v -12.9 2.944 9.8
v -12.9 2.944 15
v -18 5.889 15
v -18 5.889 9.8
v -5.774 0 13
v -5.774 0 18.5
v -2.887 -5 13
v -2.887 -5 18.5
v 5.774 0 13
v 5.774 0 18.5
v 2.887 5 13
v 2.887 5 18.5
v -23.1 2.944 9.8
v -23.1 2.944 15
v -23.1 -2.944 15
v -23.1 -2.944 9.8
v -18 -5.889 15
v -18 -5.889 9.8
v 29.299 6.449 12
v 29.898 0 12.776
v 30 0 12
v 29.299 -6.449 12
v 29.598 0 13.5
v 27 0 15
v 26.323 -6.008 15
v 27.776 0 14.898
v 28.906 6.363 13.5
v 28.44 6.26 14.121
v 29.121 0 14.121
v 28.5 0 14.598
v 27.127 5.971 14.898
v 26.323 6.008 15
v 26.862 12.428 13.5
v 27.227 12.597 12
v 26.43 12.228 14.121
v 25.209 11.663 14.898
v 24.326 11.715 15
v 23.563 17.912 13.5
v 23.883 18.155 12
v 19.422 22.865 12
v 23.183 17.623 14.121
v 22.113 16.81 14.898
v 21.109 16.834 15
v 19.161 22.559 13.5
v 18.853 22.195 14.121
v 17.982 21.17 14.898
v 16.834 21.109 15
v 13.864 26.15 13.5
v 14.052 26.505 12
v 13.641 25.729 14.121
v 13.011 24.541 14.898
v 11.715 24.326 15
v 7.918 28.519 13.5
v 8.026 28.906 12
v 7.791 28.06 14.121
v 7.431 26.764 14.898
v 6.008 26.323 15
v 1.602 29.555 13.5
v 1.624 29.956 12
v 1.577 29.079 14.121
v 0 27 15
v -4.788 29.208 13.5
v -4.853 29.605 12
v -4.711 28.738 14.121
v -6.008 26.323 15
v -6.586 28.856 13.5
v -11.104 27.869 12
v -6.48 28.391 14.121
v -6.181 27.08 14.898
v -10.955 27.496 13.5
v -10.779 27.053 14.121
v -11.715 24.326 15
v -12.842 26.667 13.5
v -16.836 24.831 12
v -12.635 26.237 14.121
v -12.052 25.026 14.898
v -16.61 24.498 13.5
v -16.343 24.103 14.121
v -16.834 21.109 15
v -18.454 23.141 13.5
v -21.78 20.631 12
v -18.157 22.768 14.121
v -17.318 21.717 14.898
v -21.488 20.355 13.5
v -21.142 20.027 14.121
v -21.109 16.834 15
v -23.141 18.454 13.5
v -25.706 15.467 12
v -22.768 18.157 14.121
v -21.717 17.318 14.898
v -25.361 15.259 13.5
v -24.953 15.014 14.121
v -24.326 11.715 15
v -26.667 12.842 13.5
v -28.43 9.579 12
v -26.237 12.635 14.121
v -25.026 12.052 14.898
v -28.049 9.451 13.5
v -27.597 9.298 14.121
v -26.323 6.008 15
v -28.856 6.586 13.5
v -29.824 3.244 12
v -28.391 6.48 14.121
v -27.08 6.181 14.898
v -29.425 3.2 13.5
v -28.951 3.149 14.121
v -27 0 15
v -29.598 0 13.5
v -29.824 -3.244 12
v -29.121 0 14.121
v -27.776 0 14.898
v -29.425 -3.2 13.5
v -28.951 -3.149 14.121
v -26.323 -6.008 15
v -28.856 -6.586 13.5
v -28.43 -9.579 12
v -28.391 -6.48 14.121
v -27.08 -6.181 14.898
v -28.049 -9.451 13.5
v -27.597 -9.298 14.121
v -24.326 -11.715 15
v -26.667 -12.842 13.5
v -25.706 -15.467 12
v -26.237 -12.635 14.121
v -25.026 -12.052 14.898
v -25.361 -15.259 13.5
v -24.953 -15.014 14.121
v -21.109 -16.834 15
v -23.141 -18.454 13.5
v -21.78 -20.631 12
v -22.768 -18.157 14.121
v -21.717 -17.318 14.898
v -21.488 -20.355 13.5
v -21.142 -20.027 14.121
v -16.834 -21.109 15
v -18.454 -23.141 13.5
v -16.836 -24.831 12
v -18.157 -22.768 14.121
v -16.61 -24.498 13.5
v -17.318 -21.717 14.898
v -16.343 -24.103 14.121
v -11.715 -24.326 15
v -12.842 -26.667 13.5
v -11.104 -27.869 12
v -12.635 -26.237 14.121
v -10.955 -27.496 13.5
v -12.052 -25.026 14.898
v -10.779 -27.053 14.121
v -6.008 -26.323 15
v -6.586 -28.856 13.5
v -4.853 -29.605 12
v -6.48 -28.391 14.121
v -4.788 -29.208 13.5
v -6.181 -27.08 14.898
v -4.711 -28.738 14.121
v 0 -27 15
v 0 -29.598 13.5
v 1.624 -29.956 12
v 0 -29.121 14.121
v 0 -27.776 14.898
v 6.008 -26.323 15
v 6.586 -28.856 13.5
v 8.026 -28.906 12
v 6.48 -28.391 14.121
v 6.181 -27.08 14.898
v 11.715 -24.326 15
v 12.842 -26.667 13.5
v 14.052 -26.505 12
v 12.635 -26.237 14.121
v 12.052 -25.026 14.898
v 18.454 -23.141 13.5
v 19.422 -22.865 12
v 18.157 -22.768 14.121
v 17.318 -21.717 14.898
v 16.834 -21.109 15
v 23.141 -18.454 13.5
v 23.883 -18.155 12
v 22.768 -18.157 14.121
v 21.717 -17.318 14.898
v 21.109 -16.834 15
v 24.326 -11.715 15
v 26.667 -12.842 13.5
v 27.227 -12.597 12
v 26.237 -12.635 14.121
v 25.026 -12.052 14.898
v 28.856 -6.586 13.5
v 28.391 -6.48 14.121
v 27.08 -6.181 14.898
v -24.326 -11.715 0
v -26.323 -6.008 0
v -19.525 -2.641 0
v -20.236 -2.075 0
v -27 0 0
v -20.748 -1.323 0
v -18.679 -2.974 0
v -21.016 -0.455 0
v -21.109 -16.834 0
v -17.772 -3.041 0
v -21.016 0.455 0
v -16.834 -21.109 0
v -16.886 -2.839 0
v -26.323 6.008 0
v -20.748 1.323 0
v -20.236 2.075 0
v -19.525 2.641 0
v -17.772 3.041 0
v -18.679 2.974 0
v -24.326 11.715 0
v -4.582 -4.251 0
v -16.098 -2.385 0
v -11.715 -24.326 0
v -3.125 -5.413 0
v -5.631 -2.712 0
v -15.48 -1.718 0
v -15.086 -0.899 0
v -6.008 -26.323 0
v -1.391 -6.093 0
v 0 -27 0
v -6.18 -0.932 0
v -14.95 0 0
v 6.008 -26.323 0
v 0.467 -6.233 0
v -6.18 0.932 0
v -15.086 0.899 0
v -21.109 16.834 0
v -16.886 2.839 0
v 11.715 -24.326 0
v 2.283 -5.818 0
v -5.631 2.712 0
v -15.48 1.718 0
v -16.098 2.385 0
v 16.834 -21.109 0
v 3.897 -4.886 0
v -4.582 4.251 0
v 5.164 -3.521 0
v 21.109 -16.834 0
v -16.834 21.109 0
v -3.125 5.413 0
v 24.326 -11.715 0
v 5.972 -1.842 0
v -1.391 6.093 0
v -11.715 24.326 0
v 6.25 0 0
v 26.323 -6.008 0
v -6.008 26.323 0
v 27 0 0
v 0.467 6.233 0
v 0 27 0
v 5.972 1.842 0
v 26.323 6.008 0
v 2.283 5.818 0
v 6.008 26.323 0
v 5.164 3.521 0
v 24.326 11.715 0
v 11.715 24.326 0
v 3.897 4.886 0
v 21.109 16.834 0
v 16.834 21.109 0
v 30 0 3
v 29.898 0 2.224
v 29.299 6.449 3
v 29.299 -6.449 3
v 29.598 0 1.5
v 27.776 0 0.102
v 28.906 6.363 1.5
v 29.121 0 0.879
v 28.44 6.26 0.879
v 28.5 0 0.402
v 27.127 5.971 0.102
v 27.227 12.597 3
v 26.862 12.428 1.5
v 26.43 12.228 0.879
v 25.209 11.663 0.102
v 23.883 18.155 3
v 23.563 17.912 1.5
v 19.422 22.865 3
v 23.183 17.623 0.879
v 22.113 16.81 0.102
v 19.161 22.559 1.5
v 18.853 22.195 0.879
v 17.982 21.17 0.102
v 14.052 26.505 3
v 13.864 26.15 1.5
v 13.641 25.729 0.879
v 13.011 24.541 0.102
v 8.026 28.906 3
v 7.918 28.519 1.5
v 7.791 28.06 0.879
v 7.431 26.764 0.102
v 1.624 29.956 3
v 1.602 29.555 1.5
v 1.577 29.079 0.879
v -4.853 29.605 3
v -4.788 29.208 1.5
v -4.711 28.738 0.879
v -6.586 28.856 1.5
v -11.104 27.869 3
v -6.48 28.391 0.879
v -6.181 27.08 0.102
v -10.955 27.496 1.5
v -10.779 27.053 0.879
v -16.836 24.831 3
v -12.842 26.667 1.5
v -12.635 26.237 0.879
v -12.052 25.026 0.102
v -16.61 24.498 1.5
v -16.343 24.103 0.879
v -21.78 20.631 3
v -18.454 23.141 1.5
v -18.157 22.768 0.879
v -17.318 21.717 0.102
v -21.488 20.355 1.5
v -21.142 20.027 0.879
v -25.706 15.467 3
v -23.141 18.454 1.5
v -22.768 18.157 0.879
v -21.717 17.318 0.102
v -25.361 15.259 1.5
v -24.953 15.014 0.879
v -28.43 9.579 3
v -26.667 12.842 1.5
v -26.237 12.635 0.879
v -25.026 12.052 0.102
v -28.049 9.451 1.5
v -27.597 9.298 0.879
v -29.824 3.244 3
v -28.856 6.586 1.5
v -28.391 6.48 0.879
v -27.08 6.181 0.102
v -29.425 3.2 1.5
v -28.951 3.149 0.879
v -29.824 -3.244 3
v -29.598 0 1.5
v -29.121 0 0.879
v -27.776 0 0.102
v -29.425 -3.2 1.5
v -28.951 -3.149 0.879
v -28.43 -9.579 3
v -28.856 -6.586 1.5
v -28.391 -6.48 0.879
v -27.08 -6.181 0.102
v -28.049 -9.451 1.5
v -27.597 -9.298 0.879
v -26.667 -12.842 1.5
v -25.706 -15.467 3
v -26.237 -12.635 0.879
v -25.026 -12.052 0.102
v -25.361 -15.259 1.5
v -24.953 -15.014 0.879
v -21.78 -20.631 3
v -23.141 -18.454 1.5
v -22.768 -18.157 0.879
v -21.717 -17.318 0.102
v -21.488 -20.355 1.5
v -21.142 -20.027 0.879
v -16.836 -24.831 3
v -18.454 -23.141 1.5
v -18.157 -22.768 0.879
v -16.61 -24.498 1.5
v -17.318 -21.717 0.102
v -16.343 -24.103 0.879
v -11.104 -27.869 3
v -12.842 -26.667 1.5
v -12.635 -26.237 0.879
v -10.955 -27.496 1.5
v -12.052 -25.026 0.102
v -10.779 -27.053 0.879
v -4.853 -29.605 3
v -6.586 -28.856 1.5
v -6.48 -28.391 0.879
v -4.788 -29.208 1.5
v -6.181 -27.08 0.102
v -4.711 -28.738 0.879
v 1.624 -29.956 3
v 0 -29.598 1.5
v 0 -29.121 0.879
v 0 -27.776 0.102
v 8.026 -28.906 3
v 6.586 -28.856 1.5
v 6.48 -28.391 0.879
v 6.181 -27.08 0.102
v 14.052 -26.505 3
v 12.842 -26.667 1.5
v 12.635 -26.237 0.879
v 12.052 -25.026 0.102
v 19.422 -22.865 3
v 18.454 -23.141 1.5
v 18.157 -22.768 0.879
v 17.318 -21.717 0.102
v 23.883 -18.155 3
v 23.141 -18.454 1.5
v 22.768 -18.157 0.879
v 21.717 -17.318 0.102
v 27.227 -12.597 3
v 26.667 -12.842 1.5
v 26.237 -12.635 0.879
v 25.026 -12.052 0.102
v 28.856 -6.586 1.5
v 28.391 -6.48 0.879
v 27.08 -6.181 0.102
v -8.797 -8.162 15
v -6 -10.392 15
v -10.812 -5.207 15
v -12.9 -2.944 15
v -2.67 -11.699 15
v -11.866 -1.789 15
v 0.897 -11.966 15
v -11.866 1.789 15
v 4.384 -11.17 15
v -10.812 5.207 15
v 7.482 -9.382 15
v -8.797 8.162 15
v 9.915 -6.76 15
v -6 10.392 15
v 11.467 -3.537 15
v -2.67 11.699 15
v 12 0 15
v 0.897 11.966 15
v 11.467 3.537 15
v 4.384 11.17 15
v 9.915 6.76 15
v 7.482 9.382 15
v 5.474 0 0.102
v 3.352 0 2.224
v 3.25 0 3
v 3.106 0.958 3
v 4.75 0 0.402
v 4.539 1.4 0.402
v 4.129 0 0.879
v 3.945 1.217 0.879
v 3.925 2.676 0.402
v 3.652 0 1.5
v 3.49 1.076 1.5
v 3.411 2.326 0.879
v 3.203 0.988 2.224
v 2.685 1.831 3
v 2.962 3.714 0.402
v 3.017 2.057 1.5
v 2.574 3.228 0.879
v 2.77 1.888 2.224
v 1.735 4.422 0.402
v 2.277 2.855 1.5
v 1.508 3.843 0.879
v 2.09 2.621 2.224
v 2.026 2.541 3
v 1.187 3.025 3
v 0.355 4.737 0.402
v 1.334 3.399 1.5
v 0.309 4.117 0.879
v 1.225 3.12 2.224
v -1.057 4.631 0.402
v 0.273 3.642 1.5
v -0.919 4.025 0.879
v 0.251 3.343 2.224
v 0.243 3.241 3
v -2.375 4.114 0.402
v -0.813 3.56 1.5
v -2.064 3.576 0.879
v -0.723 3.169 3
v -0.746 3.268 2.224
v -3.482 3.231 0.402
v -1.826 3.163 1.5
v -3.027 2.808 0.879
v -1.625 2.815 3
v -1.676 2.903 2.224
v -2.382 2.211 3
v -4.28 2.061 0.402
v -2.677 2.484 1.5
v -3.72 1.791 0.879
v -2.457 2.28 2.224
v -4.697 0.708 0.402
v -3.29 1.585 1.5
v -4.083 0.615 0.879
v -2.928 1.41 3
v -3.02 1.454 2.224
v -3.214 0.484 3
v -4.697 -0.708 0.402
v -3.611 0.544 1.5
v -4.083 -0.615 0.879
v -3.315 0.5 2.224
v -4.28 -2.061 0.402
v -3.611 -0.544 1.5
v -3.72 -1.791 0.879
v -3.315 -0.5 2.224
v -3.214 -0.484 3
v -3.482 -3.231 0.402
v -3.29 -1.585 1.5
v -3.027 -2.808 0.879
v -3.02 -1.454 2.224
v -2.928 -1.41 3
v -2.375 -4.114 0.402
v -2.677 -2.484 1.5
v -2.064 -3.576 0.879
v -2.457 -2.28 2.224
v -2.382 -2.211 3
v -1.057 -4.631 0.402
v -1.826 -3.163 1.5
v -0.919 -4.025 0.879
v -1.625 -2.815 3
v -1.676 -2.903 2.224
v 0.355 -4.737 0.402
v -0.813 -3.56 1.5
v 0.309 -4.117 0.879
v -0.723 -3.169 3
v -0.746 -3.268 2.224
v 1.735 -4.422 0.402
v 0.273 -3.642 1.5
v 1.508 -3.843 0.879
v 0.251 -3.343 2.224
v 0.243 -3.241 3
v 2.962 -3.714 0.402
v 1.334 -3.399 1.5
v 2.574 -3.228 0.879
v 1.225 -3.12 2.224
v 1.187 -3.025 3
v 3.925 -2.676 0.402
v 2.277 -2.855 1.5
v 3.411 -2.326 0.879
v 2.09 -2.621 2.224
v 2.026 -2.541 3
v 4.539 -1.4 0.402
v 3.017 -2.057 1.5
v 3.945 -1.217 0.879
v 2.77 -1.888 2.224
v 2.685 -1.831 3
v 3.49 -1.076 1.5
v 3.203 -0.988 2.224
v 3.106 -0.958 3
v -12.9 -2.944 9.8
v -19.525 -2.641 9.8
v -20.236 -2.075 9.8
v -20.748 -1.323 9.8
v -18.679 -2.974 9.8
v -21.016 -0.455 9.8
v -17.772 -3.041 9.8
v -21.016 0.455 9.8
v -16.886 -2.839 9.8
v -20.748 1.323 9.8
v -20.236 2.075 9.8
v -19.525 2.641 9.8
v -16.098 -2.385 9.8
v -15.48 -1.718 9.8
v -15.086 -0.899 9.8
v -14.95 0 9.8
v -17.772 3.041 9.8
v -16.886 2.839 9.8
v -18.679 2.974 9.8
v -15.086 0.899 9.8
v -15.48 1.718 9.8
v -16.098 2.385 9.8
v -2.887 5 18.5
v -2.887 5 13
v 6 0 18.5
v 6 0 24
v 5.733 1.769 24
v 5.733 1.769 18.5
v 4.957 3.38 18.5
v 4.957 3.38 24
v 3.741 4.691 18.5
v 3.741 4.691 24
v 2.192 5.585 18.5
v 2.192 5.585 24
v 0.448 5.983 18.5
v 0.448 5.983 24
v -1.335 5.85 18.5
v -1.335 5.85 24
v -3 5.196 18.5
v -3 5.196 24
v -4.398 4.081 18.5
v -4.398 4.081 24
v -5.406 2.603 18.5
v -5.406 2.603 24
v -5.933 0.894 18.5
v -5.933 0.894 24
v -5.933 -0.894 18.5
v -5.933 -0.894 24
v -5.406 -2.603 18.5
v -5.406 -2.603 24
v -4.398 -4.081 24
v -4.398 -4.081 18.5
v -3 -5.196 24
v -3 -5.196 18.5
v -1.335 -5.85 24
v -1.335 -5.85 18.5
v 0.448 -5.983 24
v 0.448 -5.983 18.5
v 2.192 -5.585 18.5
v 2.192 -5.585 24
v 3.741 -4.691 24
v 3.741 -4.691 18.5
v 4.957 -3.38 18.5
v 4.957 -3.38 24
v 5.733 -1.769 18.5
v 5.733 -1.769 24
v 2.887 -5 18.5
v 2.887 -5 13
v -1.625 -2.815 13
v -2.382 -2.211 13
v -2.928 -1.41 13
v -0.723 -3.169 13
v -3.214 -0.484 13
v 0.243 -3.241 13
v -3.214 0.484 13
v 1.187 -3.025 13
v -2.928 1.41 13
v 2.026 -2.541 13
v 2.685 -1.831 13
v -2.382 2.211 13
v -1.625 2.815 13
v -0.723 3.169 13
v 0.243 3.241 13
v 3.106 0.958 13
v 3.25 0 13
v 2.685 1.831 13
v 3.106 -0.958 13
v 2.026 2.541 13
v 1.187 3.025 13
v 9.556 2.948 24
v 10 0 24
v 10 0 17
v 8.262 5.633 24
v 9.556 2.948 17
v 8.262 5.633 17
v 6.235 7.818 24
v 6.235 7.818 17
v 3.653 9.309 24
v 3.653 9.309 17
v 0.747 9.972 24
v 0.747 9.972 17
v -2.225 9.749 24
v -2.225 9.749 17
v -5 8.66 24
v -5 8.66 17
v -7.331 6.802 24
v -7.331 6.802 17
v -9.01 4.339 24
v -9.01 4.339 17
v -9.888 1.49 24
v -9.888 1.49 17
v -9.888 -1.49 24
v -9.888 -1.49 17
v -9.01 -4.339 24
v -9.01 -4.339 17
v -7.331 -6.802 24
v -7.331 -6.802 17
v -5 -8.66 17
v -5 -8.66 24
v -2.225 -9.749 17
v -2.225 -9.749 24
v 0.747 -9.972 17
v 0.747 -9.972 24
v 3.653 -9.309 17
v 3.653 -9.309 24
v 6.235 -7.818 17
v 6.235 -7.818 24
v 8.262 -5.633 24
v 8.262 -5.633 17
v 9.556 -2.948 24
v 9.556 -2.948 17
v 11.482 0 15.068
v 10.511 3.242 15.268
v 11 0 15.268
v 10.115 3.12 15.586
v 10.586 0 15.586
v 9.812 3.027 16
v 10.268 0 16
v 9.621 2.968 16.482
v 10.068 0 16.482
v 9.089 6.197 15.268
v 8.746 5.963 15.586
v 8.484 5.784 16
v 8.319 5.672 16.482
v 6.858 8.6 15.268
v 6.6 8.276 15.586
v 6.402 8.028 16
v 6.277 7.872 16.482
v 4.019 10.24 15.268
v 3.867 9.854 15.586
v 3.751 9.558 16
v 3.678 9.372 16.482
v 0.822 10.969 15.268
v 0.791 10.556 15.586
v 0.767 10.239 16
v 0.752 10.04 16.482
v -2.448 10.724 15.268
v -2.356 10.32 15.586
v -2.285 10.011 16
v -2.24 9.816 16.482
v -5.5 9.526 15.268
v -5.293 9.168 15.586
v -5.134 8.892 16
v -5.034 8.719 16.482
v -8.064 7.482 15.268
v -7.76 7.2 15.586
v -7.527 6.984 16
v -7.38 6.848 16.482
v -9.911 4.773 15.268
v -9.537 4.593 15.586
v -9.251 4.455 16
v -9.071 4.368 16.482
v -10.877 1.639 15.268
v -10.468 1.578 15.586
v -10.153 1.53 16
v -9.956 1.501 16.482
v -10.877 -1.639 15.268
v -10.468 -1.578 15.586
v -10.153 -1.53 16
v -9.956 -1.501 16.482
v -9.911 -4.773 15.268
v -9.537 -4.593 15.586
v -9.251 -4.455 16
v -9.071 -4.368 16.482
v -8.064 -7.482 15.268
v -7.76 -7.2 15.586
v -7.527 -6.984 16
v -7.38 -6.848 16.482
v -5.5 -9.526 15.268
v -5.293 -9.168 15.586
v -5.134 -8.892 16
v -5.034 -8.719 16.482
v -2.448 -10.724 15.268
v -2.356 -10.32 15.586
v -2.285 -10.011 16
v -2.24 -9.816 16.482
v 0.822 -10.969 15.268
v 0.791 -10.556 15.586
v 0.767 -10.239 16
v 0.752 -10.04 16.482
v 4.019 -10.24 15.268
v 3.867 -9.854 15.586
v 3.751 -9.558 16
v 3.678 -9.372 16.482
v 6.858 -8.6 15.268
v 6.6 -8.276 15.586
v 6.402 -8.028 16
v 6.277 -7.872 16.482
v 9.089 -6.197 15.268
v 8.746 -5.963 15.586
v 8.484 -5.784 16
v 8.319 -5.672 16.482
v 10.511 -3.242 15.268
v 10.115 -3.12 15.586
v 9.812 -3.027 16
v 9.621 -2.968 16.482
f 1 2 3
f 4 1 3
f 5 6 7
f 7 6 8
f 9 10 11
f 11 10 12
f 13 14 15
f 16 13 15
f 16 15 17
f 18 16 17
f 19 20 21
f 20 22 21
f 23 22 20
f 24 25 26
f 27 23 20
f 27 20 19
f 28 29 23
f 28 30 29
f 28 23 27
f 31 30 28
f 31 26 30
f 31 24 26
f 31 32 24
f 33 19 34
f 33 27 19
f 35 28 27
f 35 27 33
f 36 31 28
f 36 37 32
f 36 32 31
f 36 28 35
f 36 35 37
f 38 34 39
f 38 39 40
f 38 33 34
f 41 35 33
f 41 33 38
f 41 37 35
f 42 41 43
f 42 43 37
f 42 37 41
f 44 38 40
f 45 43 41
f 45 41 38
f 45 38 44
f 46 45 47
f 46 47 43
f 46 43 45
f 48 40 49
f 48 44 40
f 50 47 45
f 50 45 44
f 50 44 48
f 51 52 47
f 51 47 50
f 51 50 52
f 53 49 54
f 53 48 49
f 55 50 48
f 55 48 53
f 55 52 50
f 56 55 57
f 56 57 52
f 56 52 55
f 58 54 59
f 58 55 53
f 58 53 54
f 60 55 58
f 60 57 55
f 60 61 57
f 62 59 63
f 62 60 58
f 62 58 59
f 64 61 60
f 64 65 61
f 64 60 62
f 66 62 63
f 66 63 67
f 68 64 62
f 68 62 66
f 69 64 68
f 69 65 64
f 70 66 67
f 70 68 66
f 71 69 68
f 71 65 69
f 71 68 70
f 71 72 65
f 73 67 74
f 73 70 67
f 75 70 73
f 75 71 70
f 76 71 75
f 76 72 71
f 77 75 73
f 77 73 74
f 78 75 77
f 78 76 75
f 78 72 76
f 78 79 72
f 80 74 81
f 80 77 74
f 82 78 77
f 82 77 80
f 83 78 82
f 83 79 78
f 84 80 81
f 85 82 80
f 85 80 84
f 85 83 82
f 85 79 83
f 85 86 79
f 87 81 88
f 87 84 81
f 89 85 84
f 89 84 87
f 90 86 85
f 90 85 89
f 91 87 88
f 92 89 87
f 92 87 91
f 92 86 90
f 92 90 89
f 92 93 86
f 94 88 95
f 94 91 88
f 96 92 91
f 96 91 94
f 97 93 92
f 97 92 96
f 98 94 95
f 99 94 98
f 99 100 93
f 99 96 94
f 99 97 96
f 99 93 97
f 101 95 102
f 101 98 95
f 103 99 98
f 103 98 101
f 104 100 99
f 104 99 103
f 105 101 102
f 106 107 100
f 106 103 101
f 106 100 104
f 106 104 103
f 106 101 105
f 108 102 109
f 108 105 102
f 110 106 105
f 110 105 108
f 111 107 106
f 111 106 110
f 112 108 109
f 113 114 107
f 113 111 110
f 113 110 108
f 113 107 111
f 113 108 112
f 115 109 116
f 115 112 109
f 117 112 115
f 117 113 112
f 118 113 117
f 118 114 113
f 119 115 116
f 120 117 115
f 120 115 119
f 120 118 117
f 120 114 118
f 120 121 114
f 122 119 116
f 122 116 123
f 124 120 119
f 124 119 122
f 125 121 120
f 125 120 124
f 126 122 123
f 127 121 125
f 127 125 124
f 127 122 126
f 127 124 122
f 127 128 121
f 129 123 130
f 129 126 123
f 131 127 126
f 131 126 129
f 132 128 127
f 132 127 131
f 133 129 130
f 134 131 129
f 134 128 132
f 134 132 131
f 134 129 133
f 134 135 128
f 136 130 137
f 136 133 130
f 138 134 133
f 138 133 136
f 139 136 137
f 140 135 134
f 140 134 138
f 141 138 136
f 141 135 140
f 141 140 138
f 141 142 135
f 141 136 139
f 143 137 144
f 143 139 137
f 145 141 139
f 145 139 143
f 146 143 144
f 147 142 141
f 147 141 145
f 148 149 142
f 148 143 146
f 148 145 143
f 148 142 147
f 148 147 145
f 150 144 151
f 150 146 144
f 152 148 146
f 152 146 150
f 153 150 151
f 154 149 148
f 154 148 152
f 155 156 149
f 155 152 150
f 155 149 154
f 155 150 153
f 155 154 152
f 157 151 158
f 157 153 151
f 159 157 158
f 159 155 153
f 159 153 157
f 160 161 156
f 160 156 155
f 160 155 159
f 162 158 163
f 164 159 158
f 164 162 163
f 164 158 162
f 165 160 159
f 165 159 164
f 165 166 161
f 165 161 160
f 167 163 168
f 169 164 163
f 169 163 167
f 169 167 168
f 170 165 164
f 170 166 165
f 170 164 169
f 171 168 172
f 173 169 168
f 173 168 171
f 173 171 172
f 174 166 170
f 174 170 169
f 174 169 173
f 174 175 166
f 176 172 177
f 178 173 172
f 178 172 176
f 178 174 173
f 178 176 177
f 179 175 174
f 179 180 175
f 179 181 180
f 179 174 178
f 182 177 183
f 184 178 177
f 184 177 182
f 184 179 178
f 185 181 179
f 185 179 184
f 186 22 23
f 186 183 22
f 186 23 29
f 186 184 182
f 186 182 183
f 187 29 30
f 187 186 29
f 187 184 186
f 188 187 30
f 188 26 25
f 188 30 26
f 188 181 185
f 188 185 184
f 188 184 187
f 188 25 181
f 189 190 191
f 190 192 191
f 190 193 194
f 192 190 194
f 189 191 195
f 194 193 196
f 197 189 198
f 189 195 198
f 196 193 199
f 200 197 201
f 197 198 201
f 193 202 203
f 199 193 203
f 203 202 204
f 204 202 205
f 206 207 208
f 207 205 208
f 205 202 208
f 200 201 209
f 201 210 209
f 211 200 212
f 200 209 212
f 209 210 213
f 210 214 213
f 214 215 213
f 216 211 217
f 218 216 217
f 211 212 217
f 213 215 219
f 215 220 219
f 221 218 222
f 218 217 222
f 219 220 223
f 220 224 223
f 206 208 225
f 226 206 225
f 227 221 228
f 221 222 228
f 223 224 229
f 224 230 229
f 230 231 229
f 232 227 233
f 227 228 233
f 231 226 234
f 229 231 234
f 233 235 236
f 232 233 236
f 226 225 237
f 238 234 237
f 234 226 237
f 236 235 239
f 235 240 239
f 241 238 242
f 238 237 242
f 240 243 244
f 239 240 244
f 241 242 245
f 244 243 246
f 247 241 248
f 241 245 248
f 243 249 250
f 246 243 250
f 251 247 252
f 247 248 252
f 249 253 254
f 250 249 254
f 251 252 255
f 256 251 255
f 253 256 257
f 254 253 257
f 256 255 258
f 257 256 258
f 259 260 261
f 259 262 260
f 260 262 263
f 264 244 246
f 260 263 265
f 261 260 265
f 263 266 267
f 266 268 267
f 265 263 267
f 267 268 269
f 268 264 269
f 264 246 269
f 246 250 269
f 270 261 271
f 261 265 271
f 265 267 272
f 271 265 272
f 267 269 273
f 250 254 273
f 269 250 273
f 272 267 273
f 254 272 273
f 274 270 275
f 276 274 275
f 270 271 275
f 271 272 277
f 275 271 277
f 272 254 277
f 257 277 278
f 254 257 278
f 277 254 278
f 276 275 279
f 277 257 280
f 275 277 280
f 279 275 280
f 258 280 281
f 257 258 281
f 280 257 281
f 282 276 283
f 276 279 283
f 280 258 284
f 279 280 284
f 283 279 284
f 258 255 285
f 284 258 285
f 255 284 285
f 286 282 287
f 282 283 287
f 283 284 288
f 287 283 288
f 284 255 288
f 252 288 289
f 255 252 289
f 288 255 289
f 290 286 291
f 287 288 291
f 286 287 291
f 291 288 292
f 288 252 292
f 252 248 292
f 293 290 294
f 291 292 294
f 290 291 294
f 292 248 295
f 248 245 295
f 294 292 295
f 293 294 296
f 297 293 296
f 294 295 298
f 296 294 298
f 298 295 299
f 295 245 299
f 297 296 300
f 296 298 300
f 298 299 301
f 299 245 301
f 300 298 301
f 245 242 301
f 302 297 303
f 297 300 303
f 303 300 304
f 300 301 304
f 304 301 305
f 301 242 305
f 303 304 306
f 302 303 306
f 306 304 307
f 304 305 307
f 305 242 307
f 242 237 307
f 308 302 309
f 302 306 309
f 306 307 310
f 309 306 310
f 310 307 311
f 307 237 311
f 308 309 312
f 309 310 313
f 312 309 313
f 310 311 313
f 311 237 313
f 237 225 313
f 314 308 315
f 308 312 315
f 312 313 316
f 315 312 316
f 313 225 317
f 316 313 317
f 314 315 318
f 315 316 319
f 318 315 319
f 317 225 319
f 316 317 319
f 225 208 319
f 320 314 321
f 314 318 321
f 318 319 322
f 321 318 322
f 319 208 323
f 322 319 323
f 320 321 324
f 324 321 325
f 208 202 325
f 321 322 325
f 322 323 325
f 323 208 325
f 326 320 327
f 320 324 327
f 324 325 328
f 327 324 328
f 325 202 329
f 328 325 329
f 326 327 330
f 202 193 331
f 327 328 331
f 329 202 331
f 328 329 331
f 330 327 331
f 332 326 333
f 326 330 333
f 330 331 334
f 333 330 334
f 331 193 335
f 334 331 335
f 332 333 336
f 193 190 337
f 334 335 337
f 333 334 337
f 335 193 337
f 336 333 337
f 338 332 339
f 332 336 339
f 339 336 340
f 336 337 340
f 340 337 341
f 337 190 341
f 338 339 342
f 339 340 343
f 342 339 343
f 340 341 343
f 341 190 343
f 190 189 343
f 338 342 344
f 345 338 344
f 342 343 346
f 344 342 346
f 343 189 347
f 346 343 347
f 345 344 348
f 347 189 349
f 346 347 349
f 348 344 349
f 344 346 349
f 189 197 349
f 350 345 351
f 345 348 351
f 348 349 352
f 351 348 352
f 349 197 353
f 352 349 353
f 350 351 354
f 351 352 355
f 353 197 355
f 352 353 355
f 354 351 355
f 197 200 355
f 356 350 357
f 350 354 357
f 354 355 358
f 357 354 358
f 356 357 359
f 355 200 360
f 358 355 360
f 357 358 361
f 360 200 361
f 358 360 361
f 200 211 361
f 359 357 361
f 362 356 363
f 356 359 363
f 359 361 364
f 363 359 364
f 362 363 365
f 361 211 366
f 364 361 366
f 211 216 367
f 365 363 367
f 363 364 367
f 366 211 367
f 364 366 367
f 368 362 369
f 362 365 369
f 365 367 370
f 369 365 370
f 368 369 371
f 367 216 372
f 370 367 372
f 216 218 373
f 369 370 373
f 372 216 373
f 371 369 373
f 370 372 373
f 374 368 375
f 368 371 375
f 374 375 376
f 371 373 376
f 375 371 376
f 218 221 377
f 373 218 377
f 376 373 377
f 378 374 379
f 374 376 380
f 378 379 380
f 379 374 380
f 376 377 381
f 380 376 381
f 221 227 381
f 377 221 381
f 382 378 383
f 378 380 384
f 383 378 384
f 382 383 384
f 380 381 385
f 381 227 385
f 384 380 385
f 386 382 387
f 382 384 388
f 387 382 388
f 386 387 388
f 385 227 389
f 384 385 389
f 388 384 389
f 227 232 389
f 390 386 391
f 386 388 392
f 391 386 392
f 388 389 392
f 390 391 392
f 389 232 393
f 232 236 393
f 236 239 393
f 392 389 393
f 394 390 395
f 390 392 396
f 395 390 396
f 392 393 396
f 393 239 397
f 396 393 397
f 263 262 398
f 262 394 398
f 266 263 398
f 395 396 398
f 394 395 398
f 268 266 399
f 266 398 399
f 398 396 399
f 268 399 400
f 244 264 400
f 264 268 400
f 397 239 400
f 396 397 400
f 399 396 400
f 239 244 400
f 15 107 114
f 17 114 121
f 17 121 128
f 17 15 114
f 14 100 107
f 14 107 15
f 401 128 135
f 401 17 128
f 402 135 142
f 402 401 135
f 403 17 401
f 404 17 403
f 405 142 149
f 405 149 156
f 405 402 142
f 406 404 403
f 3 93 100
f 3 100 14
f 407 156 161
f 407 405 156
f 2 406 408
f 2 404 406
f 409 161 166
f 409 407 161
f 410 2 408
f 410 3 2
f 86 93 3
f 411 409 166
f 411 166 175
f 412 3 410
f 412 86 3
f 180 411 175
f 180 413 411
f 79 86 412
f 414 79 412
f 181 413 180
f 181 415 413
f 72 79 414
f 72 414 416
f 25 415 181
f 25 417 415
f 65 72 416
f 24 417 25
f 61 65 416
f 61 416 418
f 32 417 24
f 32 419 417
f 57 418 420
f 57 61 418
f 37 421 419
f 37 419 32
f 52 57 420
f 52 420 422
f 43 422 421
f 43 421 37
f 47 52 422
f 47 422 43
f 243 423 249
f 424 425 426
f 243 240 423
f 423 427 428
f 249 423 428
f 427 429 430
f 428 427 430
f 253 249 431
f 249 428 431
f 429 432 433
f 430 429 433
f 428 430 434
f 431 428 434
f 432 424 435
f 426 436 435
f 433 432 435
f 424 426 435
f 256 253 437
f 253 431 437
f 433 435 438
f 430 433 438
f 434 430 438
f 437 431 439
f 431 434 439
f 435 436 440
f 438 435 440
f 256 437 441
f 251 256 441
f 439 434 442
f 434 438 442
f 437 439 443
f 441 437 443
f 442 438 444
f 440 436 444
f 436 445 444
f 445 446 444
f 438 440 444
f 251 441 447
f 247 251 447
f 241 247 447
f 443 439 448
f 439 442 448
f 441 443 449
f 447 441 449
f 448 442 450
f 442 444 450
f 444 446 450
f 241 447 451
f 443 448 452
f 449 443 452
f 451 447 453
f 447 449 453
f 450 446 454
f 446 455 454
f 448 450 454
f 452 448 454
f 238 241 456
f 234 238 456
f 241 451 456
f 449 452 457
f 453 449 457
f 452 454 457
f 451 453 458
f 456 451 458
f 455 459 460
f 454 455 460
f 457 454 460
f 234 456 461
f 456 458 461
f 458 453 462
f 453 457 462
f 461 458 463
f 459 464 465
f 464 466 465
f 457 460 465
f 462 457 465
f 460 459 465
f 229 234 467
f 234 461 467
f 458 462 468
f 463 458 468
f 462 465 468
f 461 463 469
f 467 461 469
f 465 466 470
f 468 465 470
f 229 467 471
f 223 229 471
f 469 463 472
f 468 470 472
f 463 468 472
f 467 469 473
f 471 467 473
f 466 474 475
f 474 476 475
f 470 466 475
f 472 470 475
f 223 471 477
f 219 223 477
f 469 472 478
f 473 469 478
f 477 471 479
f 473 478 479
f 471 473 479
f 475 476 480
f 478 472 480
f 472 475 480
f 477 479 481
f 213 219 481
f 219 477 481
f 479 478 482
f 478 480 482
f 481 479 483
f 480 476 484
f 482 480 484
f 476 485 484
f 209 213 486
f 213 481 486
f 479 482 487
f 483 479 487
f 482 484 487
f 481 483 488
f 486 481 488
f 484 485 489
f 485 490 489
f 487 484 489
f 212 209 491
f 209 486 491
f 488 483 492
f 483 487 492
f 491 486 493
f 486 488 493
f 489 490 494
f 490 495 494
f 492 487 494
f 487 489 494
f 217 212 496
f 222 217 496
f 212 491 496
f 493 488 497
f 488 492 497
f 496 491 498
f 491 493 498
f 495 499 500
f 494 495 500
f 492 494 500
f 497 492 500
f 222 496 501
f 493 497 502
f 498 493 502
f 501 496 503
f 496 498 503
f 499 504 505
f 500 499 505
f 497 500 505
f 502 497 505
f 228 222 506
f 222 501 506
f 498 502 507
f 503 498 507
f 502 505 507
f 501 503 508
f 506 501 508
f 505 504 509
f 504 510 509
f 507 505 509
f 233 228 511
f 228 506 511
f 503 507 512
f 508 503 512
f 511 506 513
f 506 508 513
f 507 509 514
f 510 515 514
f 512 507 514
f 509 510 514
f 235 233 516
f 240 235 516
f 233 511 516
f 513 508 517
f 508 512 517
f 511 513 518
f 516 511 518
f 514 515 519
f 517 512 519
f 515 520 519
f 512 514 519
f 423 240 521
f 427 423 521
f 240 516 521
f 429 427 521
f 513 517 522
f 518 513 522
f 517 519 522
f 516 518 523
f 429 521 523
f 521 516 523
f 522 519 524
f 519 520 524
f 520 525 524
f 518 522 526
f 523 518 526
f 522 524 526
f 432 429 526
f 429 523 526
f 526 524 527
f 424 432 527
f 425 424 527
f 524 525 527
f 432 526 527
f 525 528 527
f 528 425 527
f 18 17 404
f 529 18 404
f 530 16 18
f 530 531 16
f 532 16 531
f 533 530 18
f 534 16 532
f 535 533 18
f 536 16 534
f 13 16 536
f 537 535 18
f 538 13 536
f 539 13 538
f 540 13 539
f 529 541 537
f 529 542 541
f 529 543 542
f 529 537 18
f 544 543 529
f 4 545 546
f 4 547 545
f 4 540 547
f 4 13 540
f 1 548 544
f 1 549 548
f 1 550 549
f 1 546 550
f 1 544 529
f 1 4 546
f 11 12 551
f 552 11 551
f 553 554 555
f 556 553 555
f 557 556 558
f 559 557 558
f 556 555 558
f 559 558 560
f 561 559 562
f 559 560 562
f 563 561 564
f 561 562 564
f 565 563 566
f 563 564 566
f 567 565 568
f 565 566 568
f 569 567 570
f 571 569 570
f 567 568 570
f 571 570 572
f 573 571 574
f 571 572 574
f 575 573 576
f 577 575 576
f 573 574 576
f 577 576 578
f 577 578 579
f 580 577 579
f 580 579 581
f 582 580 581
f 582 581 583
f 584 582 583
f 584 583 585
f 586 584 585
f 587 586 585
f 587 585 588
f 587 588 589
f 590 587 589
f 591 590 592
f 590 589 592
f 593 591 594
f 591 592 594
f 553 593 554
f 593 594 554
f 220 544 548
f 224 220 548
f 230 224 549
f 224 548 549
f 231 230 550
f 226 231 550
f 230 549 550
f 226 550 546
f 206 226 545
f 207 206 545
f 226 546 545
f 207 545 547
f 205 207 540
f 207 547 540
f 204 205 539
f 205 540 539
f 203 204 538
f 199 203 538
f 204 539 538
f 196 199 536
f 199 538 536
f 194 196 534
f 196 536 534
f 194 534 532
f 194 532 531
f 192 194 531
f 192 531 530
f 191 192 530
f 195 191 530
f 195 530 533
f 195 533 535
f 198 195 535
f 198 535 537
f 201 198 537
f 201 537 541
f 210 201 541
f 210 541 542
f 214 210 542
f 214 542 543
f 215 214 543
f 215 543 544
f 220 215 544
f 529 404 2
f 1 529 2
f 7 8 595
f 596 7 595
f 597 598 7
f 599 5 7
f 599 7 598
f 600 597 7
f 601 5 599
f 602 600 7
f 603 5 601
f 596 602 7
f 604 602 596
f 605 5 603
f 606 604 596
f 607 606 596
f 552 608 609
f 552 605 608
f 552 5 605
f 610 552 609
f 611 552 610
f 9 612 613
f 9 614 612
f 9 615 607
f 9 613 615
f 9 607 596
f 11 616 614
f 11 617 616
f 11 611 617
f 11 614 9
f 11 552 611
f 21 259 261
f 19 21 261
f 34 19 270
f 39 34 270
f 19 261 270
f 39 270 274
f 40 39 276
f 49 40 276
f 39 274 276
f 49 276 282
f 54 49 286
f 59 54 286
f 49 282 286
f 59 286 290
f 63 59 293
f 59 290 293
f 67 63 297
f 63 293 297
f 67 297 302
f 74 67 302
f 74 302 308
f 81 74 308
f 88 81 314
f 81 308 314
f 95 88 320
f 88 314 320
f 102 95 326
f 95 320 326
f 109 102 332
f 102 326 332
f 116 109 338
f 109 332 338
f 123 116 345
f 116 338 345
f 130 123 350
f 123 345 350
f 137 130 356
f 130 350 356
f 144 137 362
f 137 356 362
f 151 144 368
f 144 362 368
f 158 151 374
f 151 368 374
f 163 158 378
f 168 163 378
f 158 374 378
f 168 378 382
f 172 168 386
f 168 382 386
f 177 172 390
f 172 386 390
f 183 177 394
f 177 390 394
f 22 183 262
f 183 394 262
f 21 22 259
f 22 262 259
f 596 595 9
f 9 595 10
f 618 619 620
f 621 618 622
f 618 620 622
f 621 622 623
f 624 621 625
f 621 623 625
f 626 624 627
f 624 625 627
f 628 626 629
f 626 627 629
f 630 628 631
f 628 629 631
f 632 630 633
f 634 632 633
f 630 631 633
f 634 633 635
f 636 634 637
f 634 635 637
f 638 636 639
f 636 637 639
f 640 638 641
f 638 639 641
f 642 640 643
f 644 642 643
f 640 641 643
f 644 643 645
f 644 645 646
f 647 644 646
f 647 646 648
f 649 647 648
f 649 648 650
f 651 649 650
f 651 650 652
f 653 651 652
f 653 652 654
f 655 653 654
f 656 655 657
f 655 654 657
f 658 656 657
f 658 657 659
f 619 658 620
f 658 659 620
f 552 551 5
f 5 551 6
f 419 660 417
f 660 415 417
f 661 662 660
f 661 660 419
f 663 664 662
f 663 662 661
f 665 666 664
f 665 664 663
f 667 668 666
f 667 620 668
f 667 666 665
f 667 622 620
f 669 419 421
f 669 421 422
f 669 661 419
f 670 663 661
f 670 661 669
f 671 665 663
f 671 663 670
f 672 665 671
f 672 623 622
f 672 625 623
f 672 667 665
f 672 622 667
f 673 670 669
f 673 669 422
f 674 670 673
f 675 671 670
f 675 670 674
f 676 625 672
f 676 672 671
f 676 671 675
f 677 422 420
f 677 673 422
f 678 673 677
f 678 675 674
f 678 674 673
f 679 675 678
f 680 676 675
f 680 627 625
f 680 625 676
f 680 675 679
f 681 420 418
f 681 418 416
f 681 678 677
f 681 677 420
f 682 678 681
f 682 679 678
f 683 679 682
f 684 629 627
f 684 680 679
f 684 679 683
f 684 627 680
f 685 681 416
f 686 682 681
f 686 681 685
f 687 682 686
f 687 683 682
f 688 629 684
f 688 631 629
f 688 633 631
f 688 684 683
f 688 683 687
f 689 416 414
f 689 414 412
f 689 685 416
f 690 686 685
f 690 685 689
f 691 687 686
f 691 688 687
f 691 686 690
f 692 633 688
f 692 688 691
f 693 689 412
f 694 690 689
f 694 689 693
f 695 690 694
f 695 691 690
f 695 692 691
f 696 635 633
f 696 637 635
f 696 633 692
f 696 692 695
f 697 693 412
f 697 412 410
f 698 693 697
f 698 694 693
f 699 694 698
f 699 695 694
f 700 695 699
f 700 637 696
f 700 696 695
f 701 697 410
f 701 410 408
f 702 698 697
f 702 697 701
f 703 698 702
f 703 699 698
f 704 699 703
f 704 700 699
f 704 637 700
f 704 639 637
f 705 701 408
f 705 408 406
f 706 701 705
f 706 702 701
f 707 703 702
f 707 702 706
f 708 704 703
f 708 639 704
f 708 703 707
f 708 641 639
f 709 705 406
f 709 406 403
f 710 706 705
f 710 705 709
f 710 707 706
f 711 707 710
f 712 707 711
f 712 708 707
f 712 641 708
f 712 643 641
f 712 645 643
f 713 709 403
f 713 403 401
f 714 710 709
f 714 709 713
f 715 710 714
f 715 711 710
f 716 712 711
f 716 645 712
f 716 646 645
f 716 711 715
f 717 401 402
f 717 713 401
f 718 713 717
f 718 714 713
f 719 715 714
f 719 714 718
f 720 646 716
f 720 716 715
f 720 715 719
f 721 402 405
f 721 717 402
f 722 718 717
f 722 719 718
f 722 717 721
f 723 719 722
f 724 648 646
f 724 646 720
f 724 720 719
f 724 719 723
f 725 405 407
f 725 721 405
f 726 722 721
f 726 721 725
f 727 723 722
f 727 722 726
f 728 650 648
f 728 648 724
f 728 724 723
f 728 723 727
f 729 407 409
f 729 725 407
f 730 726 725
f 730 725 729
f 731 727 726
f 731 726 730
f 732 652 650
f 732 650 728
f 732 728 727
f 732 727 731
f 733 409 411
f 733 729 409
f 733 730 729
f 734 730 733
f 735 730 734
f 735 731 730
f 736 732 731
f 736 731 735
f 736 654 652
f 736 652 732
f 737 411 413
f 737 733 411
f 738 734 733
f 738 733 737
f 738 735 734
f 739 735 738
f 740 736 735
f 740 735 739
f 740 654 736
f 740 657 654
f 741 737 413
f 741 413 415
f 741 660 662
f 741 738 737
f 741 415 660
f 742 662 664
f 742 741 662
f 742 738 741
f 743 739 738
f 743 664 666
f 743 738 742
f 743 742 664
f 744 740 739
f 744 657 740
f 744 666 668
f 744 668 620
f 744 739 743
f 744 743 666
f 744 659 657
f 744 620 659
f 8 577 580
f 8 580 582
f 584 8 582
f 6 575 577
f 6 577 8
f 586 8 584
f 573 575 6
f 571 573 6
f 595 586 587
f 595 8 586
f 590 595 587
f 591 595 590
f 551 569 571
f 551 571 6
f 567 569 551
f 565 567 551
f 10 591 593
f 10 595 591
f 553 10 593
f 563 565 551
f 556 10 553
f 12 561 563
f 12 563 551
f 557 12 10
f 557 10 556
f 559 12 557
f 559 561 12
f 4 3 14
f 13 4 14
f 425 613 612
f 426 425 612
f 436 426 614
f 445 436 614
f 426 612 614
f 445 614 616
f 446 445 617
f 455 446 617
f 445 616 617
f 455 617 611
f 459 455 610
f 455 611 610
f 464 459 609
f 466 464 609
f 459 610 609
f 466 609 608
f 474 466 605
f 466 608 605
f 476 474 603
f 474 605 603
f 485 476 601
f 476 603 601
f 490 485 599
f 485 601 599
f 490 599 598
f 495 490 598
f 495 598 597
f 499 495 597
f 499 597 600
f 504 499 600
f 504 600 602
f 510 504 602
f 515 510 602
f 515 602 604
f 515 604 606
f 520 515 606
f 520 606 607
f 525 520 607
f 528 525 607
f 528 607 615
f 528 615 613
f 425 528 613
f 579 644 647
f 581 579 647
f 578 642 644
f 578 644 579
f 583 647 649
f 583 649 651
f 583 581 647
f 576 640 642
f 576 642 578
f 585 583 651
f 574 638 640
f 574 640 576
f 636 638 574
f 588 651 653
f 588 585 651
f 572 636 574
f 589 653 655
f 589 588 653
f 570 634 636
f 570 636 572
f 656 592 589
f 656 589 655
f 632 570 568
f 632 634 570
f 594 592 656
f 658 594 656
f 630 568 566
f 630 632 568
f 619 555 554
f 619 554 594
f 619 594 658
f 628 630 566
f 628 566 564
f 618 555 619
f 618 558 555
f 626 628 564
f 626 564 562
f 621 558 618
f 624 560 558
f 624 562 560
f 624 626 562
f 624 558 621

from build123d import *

# Parameters (mm, degrees)
SKETCH1_R           = 30
BOSS_EXTRUDE1_DEPTH = 15
SKETCH2_R           = 10
BOSS_EXTRUDE2_DEPTH = 9
SKETCH3_R           = 3.25
CUT_EXTRUDE1_DEPTH  = 25
FILLET1_R           = 3
SKETCH8_R           = 3.05
CUT_EXTRUDE3_DEPTH  = 16
CUT_EXTRUDE4_DEPTH  = 5.2
SKETCH9_R           = 6
CUT_EXTRUDE5_DEPTH  = 5.5
CUT_EXTRUDE6_DEPTH  = 5.5
FILLET2_R           = 2


with BuildPart() as part:
    # Sketch1 → Boss-Extrude1 (new body)
    with BuildSketch(Plane.XY):
        Circle(SKETCH1_R)
    extrude(amount=BOSS_EXTRUDE1_DEPTH)

    # Sketch2 → Boss-Extrude2 (add)
    with BuildSketch(Plane.XY.offset(15)):
        Circle(SKETCH2_R)
    extrude(amount=BOSS_EXTRUDE2_DEPTH)

    # Sketch3 → Cut-Extrude1 (cut, through all)
    with BuildSketch(Plane.XY.offset(24)):
        Circle(SKETCH3_R)
    extrude(amount=-CUT_EXTRUDE1_DEPTH, mode=Mode.SUBTRACT)

    # Fillet1
    fillet1_edges = [part.edges().sort_by_distance(p)[0] for p in [
        (-3.25, 0, 0),
        (-30, 0, 0),
        (-30, 0, 15),
    ]]
    fillet(fillet1_edges, radius=FILLET1_R)

    # Sketch8 → Cut-Extrude3 (cut, through all)
    with BuildSketch(Plane.XY.offset(15)):
        with Locations((-18, 0)):
            Circle(SKETCH8_R)
    extrude(amount=-CUT_EXTRUDE3_DEPTH, mode=Mode.SUBTRACT)

    # Sketch7 → Cut-Extrude4 (cut)
    with BuildSketch(Plane.XY.offset(15)):
        Polygon((-23.1, 2.944486373), (-23.1, -2.944486373), (-18, -5.888972746), (-12.9, -2.944486373), (-12.9, 2.944486373), (-18, 5.888972746), align=None)
    extrude(amount=-CUT_EXTRUDE4_DEPTH, mode=Mode.SUBTRACT)

    # Sketch9 → Cut-Extrude5 (cut)
    with BuildSketch(Plane.XY.offset(24)):
        Circle(SKETCH9_R)
    extrude(amount=-CUT_EXTRUDE5_DEPTH, mode=Mode.SUBTRACT)

    # Sketch10 → Cut-Extrude6 (cut)
    with BuildSketch(Plane.XY.offset(18.5)):
        Polygon((5.773502692, 0), (2.886751346, 5), (-2.886751346, 5), (-5.773502692, 0), (-2.886751346, -5), (2.886751346, -5), align=None)
    extrude(amount=-CUT_EXTRUDE6_DEPTH, mode=Mode.SUBTRACT)

    # Fillet2
    fillet2_edges = [part.edges().sort_by_distance(p)[0] for p in [
        (-10, 0, 15),
    ]]
    fillet(fillet2_edges, radius=FILLET2_R)


solid = part.part
